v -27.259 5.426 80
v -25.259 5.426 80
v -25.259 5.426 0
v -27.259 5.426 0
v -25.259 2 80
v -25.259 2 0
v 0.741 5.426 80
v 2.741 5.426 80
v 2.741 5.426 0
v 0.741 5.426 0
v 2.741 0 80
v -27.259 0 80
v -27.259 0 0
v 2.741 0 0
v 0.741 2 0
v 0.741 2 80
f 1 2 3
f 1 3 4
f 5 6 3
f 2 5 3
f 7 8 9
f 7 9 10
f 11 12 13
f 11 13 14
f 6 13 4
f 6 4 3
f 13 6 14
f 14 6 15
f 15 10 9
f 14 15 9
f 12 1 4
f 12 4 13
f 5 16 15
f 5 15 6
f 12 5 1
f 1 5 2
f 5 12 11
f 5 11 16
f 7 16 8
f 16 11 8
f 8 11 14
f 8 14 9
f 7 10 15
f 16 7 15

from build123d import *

# Parameters (mm, degrees)
BOSS_EXTRU_1_DEPTH      = 95
ESQUISSE2_W             = 15
ESQUISSE2_H             = 5.425563258
ENL_V_MAT_EXTRU_1_DEPTH = 46


with BuildPart() as part:
    # Esquisse1 → Boss.-Extru.1 (new body)
    with BuildSketch(Plane.XY):
        Polygon((-27.258684463, 5.425563258), (-27.258684463, 0), (2.741315537, 0), (2.741315537, 5.425563258), (0.741315537, 5.425563258), (0.741315537, 2), (-25.258684463, 2), (-25.258684463, 5.425563258), align=None)
    extrude(amount=BOSS_EXTRU_1_DEPTH)

    # Esquisse2 → Enlèv. mat.-Extru.1 (cut)
    with BuildSketch(Plane(origin=(2.741315537, 0, 0), x_dir=(0, 0, -1), z_dir=(1, 0, 0))):
        with Locations((-87.5, 2.712781629)):
            Rectangle(ESQUISSE2_W, ESQUISSE2_H)
    extrude(amount=-ENL_V_MAT_EXTRU_1_DEPTH, mode=Mode.SUBTRACT)


solid = part.part
